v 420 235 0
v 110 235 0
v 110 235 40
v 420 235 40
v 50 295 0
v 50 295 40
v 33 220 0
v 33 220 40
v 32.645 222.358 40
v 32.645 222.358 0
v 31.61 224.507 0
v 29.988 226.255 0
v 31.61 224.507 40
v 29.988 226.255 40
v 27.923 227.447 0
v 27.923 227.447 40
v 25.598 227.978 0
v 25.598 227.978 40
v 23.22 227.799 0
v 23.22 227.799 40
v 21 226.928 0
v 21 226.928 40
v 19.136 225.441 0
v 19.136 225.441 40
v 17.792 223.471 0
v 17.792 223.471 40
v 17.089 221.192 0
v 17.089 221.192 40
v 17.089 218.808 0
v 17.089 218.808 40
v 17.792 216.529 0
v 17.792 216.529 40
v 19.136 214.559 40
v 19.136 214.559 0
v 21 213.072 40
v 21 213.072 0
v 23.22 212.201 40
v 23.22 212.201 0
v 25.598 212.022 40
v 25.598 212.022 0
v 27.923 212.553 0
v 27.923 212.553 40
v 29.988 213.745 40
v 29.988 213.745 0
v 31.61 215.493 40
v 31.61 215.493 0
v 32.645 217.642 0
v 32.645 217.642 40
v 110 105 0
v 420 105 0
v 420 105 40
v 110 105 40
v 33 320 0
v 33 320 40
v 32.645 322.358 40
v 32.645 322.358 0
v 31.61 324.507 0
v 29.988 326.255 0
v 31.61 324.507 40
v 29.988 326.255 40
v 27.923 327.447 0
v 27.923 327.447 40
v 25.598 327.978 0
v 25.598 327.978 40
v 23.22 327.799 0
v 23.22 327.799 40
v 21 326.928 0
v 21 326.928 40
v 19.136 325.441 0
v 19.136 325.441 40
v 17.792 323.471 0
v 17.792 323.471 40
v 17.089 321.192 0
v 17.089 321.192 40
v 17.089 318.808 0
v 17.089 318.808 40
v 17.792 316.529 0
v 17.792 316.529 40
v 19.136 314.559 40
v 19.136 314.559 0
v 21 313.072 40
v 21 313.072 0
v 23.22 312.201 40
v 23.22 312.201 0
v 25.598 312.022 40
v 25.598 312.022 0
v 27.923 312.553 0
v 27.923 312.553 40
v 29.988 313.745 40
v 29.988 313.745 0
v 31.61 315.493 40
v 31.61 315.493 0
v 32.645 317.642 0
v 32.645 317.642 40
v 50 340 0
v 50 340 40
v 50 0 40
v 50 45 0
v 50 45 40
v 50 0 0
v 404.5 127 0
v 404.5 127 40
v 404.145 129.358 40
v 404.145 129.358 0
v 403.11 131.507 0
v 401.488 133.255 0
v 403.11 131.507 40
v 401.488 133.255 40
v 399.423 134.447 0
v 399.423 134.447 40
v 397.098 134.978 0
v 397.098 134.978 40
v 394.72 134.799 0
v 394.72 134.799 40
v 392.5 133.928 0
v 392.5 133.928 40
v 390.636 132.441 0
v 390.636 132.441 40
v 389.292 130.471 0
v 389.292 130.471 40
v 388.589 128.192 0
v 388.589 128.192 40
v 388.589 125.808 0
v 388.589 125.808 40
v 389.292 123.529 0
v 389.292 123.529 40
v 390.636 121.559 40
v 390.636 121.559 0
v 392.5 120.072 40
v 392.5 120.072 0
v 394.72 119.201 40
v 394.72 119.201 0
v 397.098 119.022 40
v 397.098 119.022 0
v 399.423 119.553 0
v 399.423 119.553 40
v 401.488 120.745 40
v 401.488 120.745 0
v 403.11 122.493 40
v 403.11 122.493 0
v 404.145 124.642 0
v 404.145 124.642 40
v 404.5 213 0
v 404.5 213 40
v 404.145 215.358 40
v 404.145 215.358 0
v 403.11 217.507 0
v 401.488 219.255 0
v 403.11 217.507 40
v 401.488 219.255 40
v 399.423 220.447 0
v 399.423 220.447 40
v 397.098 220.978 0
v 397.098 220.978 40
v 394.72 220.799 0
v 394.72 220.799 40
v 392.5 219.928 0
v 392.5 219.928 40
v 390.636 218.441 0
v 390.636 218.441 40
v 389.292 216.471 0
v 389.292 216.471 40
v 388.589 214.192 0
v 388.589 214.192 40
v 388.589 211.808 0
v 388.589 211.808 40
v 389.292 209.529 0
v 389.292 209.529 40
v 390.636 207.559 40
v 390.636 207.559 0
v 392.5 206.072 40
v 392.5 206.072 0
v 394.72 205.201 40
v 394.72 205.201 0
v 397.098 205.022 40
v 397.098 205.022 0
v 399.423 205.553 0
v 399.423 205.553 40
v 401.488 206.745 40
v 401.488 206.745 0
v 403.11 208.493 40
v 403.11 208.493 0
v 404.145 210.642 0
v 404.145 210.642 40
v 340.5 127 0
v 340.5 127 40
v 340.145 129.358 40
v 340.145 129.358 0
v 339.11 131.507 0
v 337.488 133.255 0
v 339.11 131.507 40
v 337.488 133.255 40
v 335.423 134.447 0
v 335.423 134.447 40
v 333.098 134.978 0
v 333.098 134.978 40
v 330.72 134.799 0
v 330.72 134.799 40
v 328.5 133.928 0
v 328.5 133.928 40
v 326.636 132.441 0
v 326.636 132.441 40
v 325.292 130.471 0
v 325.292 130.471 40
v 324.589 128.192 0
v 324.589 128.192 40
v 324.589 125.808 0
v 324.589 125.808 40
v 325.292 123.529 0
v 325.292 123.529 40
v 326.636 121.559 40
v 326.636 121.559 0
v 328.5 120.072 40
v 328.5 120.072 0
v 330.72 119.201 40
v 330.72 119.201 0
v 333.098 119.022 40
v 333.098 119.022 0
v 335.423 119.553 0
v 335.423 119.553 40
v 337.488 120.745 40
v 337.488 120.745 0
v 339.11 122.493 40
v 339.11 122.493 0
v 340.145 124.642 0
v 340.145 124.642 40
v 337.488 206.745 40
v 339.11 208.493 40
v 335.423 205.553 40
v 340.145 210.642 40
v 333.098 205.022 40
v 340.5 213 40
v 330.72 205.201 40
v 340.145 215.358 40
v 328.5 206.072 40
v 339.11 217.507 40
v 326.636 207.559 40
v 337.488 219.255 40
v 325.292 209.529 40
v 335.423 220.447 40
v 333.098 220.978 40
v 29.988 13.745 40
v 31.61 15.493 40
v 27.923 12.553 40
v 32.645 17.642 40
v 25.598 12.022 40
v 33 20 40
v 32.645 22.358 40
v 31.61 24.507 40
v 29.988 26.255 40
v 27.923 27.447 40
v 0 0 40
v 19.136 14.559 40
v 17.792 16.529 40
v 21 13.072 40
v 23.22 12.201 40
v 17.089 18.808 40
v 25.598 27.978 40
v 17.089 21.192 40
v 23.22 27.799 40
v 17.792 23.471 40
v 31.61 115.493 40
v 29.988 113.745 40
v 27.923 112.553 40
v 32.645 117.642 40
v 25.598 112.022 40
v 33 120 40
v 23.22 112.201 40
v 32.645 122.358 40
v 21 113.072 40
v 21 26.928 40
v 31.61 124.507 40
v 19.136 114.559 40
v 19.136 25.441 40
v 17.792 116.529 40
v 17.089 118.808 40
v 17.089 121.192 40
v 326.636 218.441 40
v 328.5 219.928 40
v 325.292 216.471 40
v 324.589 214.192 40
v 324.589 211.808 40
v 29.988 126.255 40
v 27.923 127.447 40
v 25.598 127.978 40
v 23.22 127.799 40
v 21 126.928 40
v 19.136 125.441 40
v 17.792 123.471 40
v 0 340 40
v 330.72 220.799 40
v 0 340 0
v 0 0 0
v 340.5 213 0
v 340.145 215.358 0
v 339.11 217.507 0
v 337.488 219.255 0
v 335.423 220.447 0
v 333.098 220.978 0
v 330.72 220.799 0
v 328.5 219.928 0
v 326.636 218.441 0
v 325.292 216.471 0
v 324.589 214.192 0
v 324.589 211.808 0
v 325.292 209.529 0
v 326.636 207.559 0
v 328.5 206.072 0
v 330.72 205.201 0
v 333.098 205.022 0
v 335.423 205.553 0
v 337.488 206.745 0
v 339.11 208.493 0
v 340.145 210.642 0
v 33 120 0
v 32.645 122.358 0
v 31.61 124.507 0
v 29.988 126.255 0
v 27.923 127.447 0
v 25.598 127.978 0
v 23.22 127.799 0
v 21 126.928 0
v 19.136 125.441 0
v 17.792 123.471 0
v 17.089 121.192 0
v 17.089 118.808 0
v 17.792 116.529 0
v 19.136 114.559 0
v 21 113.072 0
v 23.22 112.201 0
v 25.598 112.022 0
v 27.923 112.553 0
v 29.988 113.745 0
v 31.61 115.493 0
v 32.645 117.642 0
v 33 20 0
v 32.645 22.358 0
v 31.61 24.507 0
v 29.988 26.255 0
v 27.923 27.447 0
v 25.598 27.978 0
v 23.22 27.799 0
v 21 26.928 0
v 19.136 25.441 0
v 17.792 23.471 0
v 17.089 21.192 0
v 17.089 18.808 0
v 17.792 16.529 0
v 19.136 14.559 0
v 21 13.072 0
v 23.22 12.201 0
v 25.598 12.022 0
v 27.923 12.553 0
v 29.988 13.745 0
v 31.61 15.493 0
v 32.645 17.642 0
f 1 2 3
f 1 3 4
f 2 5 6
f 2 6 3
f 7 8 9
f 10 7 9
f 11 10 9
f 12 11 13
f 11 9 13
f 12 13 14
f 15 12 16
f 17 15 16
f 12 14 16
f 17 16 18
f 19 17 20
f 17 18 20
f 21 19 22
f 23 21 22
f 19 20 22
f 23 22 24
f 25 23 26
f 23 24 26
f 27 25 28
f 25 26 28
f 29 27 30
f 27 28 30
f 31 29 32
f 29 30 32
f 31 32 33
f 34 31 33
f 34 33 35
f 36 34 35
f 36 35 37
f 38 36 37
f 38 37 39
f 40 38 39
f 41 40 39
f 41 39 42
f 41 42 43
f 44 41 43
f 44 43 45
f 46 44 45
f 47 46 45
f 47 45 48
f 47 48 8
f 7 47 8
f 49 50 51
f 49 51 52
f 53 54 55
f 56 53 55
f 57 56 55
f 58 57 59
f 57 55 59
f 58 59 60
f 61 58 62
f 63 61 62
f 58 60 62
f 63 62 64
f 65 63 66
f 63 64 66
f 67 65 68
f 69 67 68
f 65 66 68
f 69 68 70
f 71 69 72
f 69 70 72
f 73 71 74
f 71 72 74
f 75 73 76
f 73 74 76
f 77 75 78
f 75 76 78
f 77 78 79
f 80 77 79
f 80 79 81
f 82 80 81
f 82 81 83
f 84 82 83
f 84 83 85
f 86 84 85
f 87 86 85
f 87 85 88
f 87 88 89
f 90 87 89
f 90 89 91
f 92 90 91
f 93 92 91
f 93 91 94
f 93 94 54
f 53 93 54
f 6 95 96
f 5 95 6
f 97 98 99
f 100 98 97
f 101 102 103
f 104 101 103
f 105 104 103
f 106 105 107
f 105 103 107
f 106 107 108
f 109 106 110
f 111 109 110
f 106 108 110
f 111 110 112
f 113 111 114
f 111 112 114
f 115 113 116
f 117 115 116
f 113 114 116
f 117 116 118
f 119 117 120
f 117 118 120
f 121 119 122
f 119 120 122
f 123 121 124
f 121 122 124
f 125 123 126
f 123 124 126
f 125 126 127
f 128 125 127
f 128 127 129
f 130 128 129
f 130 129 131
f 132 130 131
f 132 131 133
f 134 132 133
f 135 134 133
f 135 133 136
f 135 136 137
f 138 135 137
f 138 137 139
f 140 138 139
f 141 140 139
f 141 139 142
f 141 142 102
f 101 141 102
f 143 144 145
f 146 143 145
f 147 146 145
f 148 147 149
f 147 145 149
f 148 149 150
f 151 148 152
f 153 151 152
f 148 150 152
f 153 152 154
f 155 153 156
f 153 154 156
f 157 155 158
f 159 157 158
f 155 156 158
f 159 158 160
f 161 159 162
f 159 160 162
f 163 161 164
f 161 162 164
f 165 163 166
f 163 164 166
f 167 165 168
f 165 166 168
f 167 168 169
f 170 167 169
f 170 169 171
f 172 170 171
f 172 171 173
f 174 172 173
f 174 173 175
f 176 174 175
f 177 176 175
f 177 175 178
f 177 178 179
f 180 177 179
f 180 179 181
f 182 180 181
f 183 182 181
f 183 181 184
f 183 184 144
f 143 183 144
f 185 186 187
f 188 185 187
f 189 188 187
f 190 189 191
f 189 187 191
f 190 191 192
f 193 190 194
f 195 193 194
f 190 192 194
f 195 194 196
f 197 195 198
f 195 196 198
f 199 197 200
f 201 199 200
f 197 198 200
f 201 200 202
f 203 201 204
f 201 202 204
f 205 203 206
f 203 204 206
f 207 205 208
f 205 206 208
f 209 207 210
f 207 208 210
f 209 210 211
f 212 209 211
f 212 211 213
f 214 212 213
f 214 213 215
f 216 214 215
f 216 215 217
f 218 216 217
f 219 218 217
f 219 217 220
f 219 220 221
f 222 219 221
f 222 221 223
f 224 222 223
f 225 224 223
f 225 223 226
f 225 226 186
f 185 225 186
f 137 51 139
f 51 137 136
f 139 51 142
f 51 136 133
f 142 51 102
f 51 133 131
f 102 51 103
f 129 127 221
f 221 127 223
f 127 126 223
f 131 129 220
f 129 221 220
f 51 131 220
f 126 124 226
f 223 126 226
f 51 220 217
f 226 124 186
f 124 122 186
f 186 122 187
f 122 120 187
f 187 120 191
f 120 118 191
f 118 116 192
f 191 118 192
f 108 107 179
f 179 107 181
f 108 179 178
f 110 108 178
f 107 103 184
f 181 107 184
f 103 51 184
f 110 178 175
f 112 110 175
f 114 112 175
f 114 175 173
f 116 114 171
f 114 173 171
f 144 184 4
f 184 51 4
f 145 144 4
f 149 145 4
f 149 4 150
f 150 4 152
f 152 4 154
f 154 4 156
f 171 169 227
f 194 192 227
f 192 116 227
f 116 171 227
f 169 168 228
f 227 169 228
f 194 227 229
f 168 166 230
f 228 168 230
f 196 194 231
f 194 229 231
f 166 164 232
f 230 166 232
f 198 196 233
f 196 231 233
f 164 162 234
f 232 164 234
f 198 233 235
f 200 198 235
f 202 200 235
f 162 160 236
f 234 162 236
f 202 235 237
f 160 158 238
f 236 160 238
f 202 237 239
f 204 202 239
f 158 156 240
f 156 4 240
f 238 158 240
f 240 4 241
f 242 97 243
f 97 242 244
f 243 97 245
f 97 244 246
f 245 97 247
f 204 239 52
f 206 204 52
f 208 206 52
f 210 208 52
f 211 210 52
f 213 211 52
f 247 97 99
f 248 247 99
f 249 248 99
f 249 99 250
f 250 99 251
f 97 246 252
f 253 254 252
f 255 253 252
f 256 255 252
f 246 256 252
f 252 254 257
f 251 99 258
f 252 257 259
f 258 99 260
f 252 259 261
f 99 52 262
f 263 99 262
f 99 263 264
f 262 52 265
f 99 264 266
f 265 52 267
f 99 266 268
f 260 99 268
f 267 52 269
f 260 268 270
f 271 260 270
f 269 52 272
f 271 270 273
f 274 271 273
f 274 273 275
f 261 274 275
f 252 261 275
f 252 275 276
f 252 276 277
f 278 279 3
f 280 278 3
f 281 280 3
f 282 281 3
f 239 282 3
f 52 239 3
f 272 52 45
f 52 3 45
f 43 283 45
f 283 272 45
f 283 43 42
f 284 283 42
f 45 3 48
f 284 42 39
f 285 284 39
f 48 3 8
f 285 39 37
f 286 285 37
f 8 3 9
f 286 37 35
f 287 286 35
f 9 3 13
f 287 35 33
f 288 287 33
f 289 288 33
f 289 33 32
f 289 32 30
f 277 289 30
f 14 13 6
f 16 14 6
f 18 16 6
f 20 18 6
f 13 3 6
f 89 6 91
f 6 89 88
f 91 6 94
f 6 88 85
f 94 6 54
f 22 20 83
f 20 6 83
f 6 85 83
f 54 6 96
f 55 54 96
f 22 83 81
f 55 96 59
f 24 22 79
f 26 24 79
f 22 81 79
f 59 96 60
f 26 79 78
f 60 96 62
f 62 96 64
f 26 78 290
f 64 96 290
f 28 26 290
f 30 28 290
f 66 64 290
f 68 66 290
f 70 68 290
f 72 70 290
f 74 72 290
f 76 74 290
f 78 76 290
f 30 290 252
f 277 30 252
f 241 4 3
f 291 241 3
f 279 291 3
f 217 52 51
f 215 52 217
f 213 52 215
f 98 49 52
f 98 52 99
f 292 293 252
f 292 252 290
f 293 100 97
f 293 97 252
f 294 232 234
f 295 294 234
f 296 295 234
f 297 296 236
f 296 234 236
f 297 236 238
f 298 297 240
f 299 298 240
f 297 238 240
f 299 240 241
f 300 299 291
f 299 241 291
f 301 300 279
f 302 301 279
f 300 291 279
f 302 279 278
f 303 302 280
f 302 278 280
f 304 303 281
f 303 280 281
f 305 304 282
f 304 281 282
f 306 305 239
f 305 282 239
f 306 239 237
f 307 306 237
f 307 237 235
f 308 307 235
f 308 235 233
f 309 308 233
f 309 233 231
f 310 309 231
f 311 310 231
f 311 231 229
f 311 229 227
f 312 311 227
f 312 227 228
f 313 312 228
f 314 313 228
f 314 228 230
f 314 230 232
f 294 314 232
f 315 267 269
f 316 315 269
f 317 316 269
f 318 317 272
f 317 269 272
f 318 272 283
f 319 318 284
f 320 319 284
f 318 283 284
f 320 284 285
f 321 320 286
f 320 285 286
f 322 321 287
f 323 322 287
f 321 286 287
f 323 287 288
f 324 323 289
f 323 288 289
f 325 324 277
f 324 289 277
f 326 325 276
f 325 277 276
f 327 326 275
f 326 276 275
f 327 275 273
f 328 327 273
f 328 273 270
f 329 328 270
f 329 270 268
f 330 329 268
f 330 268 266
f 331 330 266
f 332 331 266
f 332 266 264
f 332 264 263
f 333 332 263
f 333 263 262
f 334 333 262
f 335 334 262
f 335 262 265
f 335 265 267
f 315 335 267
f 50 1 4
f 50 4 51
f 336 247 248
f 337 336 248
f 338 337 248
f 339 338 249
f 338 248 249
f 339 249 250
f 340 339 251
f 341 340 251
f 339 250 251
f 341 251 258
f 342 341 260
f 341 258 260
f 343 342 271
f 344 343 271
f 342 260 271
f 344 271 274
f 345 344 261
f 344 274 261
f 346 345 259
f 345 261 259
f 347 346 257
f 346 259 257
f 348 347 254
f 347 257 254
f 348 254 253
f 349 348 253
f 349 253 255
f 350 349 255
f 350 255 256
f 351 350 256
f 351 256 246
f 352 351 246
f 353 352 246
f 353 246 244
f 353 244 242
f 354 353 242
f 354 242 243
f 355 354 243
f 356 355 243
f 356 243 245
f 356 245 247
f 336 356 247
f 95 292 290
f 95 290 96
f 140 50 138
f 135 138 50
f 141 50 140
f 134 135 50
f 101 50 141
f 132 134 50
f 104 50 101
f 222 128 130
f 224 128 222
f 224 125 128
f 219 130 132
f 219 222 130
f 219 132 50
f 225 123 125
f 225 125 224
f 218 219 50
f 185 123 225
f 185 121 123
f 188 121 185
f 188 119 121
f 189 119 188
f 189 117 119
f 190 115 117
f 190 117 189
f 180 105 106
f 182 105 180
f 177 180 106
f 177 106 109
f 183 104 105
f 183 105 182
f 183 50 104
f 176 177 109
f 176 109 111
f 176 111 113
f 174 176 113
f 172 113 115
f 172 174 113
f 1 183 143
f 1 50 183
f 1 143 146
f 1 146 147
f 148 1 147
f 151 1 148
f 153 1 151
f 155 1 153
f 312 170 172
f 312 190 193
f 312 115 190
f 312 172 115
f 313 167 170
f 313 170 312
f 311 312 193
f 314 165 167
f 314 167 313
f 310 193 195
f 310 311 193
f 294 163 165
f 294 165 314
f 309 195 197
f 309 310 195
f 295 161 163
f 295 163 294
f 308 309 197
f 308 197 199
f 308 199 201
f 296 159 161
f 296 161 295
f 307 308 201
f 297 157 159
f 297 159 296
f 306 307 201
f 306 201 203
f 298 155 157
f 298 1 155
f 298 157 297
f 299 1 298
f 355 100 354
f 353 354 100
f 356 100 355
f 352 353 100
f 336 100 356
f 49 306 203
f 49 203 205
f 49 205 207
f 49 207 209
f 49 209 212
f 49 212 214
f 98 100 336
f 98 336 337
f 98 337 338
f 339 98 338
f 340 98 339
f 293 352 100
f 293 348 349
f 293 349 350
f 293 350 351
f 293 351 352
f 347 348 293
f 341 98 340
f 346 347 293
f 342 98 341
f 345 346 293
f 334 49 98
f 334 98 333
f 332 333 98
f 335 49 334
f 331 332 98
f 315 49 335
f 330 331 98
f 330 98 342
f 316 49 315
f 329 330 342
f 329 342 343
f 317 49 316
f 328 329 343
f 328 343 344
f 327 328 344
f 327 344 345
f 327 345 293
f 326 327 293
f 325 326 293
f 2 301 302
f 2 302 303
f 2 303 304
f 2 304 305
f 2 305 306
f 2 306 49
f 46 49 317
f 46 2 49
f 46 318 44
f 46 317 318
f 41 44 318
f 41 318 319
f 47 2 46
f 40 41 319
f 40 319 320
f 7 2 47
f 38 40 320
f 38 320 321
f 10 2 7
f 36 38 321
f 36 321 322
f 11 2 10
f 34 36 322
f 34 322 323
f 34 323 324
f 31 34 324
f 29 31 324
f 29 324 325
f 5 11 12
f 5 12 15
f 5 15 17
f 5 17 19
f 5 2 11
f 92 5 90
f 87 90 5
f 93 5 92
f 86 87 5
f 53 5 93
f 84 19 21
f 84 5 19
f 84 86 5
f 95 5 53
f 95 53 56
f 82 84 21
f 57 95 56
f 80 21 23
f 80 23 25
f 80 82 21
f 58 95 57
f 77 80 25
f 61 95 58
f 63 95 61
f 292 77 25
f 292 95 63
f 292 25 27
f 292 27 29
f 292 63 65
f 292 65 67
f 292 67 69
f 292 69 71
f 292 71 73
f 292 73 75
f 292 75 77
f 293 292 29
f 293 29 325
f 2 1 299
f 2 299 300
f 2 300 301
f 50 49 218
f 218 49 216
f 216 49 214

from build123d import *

# Parameters (mm, degrees)
BOSS_EXTRUDE1_DEPTH     = 40
SKETCH3_R               = 8
CUT_EXTRUDE1_DEPTH      = 233
CUT_EXTRUDE1_DEPTH_BACK = 172
SKETCH4_R               = 8
CUT_EXTRUDE2_DEPTH      = 81
CUT_EXTRUDE2_DEPTH_BACK = 192


with BuildPart() as part:
    # Sketch2 → Boss-Extrude1 (new body)
    with BuildSketch(Plane.XY):
        Polygon((0, 0), (0, 340), (50, 340), (50, 295), (110, 235), (420, 235), (420, 105), (110, 105), (50, 45), (50, 0), align=None)
    extrude(amount=BOSS_EXTRUDE1_DEPTH)

    # Sketch3 → Cut-Extrude1 (cut, two sides)
    with BuildSketch(Plane.XY.offset(40)) as cut_extrude1_sk:
        with Locations((25, 320)):
            Circle(SKETCH3_R)
        with Locations((25, 220)):
            Circle(SKETCH3_R)
        with Locations((25, 120)):
            Circle(SKETCH3_R)
        with Locations((25, 20)):
            Circle(SKETCH3_R)
    extrude(amount=CUT_EXTRUDE1_DEPTH, mode=Mode.SUBTRACT)
    extrude(cut_extrude1_sk.sketch, amount=-CUT_EXTRUDE1_DEPTH_BACK, mode=Mode.SUBTRACT)

    # Sketch4 → Cut-Extrude2 (cut, two sides)
    with BuildSketch(Plane.XY.offset(40)) as cut_extrude2_sk:
        with Locations((396.5, 213)):
            Circle(SKETCH4_R)
        with Locations((332.5, 213)):
            Circle(SKETCH4_R)
        with Locations((332.5, 127)):
            Circle(SKETCH4_R)
        with Locations((396.5, 127)):
            Circle(SKETCH4_R)
    extrude(amount=CUT_EXTRUDE2_DEPTH, mode=Mode.SUBTRACT)
    extrude(cut_extrude2_sk.sketch, amount=-CUT_EXTRUDE2_DEPTH_BACK, mode=Mode.SUBTRACT)


solid = part.part
